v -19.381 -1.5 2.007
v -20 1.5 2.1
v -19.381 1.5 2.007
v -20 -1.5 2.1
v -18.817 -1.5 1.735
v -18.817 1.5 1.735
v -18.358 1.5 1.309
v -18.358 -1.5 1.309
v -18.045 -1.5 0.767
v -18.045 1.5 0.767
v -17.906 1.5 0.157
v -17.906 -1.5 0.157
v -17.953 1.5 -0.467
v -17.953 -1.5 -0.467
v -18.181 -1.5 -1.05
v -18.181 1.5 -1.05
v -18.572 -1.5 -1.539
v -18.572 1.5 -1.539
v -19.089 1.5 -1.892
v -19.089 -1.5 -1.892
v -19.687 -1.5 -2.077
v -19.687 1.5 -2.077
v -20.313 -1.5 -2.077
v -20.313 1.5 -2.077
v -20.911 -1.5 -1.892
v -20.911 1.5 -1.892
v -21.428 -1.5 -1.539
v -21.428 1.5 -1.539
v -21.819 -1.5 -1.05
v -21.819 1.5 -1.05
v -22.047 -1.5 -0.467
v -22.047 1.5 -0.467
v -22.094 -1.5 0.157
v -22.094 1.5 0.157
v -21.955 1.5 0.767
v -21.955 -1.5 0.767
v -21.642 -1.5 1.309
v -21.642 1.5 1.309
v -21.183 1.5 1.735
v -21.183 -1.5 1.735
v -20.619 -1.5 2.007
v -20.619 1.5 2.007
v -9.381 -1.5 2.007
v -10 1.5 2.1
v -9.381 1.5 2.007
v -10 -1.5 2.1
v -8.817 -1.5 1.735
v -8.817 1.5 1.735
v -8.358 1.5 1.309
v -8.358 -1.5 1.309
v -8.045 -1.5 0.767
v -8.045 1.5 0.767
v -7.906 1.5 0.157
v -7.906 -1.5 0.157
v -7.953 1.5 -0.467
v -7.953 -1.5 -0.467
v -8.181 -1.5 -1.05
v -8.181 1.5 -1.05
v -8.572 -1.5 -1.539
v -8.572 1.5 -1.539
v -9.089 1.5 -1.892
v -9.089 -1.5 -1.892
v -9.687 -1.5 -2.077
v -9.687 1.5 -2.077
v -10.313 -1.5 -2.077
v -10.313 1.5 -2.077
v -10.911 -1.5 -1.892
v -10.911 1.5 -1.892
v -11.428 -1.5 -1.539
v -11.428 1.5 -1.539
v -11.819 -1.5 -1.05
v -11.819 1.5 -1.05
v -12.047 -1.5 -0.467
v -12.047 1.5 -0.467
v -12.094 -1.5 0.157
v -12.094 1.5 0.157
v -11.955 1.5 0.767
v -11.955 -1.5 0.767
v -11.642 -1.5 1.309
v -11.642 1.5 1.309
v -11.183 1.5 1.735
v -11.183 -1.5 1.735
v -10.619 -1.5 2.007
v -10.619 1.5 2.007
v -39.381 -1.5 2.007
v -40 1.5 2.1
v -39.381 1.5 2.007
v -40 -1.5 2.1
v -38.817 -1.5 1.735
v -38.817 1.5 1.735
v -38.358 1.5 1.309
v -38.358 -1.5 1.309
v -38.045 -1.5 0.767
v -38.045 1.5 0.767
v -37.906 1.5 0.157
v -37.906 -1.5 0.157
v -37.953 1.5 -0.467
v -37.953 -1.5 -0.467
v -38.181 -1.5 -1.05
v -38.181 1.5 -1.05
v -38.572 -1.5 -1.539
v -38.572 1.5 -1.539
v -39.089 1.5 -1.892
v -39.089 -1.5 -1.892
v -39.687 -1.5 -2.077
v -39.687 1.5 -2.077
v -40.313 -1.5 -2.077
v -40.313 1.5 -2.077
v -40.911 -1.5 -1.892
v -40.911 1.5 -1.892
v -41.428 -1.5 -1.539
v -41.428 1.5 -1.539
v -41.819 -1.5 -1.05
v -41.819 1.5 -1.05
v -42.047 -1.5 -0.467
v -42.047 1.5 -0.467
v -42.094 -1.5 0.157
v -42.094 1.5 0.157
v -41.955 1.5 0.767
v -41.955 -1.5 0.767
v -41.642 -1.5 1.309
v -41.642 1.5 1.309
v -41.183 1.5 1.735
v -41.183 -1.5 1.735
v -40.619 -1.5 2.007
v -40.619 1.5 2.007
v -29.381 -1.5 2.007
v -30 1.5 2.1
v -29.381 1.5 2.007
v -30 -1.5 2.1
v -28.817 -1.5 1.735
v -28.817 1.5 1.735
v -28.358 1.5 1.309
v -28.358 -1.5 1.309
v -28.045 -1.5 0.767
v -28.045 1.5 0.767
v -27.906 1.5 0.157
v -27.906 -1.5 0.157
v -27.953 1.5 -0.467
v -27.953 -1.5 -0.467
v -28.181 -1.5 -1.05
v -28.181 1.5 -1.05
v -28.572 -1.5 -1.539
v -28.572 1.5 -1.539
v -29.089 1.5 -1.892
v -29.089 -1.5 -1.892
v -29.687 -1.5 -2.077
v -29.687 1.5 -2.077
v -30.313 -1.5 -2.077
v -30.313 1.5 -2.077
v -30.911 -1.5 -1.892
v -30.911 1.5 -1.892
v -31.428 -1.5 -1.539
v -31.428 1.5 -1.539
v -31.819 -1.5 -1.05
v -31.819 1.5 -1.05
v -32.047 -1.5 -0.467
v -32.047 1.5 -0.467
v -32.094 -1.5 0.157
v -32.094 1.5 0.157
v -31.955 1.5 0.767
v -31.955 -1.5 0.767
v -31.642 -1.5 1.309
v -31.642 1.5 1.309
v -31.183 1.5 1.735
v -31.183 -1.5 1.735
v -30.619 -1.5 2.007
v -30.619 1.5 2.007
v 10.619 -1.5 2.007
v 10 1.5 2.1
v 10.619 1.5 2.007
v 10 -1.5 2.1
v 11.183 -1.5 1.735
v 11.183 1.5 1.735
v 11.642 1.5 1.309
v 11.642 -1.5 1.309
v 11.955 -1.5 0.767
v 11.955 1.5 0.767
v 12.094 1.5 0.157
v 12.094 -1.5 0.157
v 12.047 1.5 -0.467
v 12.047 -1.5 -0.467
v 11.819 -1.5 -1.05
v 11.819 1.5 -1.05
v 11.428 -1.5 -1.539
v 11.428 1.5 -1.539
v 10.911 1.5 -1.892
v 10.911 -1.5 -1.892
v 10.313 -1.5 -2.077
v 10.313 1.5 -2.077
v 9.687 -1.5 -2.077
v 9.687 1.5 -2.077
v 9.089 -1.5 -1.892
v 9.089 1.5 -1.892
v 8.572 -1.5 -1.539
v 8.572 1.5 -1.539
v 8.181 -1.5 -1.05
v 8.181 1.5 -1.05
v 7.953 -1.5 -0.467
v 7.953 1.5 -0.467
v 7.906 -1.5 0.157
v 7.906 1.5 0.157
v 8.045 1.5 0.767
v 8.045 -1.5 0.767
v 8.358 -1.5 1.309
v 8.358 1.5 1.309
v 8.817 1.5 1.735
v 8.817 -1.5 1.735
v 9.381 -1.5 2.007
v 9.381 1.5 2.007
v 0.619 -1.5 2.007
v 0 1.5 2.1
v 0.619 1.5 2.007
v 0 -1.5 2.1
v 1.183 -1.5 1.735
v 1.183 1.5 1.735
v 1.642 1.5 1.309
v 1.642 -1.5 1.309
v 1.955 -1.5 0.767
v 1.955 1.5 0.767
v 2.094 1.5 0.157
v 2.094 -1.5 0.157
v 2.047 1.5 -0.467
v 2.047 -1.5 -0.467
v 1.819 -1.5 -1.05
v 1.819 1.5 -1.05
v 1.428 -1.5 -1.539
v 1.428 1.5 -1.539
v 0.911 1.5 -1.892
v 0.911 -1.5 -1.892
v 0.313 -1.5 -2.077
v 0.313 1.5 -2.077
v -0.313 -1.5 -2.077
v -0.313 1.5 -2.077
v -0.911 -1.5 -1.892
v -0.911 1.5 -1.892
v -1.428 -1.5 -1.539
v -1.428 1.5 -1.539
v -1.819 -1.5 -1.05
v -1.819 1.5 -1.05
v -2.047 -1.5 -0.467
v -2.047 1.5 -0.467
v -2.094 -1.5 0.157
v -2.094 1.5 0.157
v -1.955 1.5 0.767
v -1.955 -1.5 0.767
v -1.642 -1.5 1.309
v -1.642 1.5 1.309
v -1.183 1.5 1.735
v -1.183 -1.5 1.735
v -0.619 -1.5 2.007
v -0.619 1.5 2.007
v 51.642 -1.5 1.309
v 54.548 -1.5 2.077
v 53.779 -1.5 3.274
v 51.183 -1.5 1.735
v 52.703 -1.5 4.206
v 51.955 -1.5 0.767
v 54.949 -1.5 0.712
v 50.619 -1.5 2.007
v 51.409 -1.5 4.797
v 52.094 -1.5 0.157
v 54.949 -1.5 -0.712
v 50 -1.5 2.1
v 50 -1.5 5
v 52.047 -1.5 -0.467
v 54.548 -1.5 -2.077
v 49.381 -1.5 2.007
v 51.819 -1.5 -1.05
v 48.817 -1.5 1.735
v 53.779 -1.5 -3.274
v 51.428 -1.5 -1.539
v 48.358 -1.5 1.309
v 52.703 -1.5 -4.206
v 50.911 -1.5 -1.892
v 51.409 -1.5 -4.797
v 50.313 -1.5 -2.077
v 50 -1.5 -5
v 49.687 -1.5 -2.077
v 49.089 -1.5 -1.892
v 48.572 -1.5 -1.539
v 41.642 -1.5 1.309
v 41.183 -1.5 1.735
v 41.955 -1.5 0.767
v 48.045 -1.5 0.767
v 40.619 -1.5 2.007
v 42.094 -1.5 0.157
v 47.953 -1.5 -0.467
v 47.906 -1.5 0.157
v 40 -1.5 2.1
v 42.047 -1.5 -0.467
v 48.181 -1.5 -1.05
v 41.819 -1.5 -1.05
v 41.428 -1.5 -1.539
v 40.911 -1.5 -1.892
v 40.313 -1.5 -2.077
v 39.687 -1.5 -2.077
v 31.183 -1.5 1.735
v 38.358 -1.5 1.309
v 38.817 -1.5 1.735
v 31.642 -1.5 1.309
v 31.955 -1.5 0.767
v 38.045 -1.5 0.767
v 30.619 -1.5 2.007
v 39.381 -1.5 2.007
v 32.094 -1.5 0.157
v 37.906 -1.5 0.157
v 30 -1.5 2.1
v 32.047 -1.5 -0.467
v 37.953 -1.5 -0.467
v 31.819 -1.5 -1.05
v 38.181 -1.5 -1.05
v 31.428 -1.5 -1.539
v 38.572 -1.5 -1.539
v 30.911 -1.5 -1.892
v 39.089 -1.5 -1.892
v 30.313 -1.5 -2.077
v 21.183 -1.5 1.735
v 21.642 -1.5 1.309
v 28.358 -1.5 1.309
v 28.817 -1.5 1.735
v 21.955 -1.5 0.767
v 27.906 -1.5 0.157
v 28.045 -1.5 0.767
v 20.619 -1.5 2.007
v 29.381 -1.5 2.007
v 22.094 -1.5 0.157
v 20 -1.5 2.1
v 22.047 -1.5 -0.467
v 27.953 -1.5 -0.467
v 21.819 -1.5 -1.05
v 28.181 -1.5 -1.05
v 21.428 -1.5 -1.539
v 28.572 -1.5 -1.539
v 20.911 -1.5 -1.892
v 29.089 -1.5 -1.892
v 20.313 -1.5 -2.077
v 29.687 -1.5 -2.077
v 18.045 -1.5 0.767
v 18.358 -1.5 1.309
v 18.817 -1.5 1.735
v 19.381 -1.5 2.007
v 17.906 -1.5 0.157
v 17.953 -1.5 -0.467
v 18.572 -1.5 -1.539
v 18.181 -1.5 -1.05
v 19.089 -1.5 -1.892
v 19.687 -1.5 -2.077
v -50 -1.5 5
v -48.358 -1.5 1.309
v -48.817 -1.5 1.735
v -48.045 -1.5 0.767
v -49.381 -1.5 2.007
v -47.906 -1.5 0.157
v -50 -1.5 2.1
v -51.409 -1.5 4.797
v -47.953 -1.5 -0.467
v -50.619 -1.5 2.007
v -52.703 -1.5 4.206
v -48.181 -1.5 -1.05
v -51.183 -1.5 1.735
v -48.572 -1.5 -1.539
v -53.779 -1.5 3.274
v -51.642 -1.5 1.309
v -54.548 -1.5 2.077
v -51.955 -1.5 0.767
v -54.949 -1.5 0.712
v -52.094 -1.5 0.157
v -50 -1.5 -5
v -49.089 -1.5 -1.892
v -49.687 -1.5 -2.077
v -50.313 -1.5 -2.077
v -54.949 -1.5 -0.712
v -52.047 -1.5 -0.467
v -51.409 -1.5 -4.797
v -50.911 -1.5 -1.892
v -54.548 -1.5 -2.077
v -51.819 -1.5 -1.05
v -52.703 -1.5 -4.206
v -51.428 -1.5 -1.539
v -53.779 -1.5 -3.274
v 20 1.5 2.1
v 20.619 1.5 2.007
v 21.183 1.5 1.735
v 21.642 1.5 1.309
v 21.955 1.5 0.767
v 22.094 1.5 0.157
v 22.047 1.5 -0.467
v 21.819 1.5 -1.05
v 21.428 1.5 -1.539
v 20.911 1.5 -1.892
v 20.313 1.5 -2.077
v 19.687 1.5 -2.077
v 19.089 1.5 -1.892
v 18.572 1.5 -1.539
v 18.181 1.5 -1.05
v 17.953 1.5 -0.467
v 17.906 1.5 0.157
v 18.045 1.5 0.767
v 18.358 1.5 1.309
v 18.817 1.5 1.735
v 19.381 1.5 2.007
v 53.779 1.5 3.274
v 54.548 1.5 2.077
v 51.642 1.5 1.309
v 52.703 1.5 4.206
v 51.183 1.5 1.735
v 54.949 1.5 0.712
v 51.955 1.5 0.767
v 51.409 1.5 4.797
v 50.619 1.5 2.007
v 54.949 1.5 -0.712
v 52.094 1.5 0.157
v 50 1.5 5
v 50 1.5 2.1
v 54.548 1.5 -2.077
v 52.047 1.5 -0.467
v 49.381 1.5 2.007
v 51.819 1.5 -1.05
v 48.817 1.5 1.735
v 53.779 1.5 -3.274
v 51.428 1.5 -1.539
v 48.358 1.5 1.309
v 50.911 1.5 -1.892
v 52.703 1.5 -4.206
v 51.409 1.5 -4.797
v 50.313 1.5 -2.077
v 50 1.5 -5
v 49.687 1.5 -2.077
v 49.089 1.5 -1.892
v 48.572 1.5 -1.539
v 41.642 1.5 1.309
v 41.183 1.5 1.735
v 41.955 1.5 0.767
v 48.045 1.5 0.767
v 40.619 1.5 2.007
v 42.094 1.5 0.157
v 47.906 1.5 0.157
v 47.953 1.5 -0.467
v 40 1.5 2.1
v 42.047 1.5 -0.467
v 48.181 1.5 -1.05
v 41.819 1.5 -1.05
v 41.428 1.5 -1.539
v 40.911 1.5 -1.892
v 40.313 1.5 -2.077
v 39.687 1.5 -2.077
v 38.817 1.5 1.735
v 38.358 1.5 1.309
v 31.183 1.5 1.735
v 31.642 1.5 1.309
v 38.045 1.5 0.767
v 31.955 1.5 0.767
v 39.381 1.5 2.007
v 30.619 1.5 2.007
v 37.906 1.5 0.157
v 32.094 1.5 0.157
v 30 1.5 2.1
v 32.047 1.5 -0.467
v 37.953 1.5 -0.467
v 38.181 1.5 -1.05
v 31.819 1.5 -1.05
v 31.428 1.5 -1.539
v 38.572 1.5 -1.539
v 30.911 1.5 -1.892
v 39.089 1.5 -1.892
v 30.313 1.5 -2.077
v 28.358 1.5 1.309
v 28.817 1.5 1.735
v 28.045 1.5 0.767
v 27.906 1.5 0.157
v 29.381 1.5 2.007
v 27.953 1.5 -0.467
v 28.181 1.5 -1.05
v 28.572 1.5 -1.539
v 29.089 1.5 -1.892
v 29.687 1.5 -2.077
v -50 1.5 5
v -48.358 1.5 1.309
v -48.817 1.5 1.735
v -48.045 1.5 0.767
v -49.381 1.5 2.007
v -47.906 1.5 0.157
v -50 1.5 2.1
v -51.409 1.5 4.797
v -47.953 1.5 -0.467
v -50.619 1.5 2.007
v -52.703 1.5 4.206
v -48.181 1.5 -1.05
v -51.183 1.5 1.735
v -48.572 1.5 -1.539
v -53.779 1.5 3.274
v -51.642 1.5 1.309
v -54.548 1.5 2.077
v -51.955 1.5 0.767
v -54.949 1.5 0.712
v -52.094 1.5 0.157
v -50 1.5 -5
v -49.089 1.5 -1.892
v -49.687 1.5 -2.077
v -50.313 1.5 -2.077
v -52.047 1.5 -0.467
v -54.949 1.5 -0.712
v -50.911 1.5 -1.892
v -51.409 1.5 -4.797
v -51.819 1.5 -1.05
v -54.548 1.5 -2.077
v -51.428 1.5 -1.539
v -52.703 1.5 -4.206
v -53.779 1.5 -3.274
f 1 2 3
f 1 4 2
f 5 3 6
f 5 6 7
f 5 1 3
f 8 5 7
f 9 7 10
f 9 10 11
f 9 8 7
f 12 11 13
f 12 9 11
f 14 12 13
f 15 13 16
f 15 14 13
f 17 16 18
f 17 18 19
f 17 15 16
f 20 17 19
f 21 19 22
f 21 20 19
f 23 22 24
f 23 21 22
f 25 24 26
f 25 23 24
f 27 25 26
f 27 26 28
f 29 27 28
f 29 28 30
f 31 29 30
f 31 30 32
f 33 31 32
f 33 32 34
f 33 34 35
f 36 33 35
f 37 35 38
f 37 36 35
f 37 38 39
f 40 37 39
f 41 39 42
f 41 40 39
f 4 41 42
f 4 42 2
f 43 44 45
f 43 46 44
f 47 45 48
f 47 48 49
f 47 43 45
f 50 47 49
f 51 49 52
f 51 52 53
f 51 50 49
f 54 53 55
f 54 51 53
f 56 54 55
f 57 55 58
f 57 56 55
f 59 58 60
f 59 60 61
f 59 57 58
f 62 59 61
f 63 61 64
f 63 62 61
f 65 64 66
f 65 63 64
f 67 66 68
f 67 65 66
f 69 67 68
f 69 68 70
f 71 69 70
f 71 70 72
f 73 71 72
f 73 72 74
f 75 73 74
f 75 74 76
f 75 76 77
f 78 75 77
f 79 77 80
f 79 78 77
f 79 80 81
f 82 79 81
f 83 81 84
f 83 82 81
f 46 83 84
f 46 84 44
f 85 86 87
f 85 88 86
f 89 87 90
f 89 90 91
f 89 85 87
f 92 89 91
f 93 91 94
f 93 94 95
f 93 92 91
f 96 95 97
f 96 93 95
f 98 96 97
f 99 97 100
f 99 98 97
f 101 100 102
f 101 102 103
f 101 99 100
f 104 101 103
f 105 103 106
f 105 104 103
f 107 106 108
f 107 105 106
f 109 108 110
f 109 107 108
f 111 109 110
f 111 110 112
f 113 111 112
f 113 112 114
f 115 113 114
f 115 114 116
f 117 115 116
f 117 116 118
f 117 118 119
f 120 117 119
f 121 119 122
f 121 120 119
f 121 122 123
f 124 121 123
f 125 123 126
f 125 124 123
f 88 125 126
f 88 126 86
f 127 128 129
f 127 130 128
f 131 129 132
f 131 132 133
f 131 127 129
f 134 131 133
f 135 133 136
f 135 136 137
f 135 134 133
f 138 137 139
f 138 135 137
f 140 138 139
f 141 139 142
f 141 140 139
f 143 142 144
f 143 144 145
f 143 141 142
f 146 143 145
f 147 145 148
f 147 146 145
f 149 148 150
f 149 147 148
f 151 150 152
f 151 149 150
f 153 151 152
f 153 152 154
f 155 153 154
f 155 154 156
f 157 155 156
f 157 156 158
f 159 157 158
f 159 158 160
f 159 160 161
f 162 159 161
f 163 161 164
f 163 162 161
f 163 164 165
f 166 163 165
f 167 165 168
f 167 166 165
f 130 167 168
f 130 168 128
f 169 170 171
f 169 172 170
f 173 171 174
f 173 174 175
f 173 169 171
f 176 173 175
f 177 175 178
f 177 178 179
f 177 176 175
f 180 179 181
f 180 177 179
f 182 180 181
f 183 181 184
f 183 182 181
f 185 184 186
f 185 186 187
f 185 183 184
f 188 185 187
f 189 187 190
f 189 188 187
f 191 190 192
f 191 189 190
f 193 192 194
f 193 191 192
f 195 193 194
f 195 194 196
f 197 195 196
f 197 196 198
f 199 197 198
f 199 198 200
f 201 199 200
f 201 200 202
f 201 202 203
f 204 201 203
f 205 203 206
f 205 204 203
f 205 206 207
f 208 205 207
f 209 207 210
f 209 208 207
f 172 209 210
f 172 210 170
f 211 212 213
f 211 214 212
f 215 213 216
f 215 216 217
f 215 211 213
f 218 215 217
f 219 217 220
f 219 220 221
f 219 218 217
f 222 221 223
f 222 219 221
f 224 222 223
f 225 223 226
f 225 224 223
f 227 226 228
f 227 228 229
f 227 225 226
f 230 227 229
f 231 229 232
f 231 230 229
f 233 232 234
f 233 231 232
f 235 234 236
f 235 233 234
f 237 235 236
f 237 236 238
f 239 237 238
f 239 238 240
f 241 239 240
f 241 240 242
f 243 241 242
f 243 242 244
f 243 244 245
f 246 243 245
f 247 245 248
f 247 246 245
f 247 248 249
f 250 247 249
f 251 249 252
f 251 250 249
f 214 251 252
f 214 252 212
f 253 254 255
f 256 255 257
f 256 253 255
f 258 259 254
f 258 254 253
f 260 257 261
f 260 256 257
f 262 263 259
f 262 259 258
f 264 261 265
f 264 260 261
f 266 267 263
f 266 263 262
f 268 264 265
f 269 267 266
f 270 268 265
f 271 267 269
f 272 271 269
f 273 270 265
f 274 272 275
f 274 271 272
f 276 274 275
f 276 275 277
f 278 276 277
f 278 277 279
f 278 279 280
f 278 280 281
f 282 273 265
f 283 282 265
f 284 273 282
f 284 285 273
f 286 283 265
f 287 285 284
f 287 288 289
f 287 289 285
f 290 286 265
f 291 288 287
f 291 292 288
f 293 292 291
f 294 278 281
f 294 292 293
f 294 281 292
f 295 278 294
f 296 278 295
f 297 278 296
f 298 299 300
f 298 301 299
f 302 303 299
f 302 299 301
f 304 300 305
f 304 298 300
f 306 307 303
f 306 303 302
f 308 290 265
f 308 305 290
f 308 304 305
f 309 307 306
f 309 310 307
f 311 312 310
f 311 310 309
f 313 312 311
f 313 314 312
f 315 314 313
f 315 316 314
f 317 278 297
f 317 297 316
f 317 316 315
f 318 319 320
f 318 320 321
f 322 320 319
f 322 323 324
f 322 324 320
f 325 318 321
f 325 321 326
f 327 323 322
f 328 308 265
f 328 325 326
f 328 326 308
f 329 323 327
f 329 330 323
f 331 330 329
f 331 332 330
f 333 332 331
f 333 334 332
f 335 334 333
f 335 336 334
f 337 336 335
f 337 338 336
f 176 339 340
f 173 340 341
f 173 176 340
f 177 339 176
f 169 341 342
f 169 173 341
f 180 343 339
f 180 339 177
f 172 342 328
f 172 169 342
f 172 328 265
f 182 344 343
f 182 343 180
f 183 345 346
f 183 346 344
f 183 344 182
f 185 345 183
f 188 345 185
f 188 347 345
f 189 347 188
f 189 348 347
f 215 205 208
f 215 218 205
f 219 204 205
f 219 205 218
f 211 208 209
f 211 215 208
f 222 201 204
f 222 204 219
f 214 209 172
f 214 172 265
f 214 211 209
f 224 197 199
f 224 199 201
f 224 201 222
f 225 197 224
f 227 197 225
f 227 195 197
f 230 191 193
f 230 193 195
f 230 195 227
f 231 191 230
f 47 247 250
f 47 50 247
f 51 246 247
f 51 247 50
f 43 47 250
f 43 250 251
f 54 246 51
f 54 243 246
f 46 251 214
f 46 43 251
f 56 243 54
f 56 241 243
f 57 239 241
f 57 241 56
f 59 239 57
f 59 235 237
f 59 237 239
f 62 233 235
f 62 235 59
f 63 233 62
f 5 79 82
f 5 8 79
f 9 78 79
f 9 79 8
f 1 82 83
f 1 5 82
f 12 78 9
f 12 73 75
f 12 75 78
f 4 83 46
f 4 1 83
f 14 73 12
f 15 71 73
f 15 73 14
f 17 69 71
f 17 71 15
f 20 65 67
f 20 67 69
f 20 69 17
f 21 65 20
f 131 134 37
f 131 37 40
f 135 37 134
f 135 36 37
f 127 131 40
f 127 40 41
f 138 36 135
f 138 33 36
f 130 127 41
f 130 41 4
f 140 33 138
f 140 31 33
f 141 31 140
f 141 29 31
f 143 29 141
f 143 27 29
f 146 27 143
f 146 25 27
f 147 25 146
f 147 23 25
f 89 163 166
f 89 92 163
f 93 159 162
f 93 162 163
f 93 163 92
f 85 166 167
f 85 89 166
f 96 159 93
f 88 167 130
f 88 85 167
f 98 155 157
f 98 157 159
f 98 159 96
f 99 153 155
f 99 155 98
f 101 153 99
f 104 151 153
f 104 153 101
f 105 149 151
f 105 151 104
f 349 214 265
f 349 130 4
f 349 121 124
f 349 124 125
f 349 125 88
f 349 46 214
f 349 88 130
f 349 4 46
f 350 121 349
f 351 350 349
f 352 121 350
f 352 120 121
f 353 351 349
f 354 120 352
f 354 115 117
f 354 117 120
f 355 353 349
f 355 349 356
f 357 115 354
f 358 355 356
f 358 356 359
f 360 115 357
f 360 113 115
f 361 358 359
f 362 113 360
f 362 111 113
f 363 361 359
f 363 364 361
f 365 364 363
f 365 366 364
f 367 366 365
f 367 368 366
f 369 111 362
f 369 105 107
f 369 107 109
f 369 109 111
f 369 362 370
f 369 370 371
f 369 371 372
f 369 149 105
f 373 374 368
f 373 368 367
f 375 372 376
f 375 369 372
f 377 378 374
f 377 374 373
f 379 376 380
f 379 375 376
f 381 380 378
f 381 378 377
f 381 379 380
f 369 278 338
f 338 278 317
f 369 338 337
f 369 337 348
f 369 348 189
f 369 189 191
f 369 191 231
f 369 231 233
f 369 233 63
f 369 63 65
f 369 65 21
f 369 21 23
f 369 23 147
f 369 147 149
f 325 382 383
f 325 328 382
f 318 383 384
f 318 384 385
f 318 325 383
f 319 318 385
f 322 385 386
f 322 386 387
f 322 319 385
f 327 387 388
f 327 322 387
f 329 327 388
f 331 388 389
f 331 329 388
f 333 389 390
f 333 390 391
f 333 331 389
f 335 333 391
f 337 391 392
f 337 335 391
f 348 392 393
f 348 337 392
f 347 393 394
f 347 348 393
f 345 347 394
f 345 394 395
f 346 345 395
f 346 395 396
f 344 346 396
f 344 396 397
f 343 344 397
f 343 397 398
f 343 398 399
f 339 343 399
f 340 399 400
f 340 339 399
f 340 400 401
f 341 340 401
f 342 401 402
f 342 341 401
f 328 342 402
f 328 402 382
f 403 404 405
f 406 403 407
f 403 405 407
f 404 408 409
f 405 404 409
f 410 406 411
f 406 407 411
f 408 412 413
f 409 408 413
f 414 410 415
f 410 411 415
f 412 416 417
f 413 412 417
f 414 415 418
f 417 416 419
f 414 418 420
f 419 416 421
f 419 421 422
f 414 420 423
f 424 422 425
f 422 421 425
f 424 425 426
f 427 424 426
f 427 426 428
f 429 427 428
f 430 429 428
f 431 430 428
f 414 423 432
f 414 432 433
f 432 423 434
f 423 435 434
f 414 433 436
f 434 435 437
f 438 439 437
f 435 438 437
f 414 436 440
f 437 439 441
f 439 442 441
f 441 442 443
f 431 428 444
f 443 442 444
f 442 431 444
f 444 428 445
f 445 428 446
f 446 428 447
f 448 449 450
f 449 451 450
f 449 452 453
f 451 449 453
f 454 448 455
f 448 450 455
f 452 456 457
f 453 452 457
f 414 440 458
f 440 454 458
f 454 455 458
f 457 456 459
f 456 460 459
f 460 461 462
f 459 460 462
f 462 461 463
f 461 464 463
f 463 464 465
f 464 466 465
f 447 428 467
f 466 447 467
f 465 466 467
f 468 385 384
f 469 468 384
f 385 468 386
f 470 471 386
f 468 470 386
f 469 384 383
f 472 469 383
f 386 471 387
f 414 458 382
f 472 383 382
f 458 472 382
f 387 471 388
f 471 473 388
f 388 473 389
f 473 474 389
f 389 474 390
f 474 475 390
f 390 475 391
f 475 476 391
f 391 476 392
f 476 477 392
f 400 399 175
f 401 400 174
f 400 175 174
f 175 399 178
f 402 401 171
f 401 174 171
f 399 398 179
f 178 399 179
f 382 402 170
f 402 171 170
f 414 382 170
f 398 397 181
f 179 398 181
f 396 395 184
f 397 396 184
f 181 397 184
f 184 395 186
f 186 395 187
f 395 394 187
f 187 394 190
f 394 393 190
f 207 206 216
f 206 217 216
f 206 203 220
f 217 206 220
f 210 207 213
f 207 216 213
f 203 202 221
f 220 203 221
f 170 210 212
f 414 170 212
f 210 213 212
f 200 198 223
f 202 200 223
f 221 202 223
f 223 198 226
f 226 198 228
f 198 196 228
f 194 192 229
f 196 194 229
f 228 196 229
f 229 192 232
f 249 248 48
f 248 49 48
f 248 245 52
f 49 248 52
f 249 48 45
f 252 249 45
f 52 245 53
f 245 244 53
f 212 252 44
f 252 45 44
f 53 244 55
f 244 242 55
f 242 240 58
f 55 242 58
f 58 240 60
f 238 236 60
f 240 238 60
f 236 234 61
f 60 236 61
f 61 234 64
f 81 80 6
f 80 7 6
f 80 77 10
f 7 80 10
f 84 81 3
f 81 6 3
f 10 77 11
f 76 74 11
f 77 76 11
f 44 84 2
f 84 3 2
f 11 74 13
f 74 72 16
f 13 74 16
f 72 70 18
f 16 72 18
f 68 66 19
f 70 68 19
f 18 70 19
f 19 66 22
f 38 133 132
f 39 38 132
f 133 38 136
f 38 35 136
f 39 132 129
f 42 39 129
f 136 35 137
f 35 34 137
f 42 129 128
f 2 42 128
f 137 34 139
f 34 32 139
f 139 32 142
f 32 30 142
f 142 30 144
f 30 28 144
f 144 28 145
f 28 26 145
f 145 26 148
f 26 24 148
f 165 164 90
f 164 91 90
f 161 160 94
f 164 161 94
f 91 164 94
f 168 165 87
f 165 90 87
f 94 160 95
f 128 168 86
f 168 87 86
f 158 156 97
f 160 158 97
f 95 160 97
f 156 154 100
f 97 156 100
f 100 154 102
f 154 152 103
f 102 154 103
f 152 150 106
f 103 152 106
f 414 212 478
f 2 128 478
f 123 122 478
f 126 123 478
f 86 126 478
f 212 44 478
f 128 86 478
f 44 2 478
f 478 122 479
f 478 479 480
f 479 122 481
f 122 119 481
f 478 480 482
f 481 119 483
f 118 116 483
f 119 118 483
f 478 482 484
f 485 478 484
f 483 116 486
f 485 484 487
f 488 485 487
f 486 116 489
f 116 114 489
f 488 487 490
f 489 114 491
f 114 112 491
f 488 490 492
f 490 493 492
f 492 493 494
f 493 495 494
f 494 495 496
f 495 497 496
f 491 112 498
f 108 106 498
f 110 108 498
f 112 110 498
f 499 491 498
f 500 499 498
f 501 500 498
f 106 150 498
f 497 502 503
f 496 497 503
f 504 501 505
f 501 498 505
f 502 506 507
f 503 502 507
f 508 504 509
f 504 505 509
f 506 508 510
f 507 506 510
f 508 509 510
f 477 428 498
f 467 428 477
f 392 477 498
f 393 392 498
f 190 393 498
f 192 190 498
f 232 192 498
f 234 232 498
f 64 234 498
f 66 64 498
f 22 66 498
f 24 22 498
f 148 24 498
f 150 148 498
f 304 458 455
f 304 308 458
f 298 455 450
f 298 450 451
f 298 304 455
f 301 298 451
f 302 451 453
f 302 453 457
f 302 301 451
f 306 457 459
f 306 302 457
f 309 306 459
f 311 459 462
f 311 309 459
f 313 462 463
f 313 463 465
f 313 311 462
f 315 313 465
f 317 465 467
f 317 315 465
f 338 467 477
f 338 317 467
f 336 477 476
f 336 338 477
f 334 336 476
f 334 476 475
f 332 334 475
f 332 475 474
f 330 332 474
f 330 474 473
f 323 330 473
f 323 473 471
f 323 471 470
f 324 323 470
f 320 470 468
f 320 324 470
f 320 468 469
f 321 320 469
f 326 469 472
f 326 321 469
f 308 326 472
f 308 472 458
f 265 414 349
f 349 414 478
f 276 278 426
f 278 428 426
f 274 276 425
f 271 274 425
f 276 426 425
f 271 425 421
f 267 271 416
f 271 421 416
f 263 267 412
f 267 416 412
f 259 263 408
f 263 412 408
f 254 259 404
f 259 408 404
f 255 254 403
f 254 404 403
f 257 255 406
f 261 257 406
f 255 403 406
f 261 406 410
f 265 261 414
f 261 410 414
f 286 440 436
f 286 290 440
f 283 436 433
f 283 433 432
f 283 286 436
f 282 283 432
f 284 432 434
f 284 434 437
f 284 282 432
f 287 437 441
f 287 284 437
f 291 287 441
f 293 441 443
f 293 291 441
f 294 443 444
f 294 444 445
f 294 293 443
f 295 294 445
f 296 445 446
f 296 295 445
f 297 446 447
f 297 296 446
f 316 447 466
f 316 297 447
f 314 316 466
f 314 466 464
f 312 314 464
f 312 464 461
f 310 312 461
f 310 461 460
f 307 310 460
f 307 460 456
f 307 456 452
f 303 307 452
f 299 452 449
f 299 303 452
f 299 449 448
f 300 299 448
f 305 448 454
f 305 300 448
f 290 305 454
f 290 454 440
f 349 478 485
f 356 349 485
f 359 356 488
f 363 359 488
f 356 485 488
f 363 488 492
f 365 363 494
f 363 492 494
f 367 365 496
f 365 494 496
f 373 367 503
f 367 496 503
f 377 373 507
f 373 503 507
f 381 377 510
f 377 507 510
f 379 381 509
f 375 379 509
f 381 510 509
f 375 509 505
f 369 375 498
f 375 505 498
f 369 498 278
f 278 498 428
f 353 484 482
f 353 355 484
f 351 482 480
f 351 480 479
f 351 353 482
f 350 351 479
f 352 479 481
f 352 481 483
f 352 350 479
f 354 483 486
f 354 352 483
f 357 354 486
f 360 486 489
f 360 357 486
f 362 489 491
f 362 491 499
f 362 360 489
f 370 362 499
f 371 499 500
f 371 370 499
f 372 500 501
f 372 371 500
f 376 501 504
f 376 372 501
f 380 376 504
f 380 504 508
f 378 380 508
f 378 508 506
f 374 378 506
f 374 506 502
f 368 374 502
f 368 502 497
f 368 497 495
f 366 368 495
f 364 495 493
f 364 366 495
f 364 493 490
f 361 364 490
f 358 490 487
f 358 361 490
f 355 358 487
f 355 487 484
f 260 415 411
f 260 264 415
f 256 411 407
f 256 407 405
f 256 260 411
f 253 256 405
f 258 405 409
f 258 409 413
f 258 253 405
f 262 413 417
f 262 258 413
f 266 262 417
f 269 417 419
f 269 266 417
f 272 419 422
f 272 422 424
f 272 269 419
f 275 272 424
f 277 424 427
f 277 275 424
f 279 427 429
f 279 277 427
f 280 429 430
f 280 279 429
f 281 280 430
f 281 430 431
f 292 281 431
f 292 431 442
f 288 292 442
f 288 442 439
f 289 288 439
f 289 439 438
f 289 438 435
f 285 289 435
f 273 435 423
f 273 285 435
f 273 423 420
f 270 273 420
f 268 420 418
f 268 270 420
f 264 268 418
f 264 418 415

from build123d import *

# Parameters (mm, degrees)
SKETCH1_R           = 2.1
BOSS_EXTRUDE1_DEPTH = 1.5


with BuildPart() as part:
    # Sketch1 → Boss-Extrude1 (new, symmetric)
    with BuildSketch(Plane(origin=(0, 0, 0), x_dir=(1, 0, 0), z_dir=(0, 1, 0))):
        with BuildLine():
            Line((-50, 5), (50, 5))
            ThreePointArc((50, 5), (55, 0), (50, -5))
            Line((50, -5), (-50, -5))
            ThreePointArc((-50, -5), (-55, 0), (-50, 5))
        make_face()
        with Locations(Location((50, 0, 0), (0, 0, 270))):
            Circle(SKETCH1_R, mode=Mode.SUBTRACT)
        with Locations(Location((40, 0, 0), (0, 0, 270))):
            Circle(SKETCH1_R, mode=Mode.SUBTRACT)
        with Locations(Location((30, 0, 0), (0, 0, 270))):
            Circle(SKETCH1_R, mode=Mode.SUBTRACT)
        with Locations(Location((20, 0, 0), (0, 0, 270))):
            Circle(SKETCH1_R, mode=Mode.SUBTRACT)
        with Locations(Location((10, 0, 0), (0, 0, 270))):
            Circle(SKETCH1_R, mode=Mode.SUBTRACT)
        with Locations(Location((0, 0, 0), (0, 0, 270))):
            Circle(SKETCH1_R, mode=Mode.SUBTRACT)
        with Locations(Location((-10, 0, 0), (0, 0, 270))):
            Circle(SKETCH1_R, mode=Mode.SUBTRACT)
        with Locations(Location((-20, 0, 0), (0, 0, 270))):
            Circle(SKETCH1_R, mode=Mode.SUBTRACT)
        with Locations(Location((-30, 0, 0), (0, 0, 270))):
            Circle(SKETCH1_R, mode=Mode.SUBTRACT)
        with Locations(Location((-40, 0, 0), (0, 0, 270))):
            Circle(SKETCH1_R, mode=Mode.SUBTRACT)
        with Locations(Location((-50, 0, 0), (0, 0, 270))):
            Circle(SKETCH1_R, mode=Mode.SUBTRACT)
    extrude(amount=BOSS_EXTRUDE1_DEPTH, both=True)


solid = part.part
